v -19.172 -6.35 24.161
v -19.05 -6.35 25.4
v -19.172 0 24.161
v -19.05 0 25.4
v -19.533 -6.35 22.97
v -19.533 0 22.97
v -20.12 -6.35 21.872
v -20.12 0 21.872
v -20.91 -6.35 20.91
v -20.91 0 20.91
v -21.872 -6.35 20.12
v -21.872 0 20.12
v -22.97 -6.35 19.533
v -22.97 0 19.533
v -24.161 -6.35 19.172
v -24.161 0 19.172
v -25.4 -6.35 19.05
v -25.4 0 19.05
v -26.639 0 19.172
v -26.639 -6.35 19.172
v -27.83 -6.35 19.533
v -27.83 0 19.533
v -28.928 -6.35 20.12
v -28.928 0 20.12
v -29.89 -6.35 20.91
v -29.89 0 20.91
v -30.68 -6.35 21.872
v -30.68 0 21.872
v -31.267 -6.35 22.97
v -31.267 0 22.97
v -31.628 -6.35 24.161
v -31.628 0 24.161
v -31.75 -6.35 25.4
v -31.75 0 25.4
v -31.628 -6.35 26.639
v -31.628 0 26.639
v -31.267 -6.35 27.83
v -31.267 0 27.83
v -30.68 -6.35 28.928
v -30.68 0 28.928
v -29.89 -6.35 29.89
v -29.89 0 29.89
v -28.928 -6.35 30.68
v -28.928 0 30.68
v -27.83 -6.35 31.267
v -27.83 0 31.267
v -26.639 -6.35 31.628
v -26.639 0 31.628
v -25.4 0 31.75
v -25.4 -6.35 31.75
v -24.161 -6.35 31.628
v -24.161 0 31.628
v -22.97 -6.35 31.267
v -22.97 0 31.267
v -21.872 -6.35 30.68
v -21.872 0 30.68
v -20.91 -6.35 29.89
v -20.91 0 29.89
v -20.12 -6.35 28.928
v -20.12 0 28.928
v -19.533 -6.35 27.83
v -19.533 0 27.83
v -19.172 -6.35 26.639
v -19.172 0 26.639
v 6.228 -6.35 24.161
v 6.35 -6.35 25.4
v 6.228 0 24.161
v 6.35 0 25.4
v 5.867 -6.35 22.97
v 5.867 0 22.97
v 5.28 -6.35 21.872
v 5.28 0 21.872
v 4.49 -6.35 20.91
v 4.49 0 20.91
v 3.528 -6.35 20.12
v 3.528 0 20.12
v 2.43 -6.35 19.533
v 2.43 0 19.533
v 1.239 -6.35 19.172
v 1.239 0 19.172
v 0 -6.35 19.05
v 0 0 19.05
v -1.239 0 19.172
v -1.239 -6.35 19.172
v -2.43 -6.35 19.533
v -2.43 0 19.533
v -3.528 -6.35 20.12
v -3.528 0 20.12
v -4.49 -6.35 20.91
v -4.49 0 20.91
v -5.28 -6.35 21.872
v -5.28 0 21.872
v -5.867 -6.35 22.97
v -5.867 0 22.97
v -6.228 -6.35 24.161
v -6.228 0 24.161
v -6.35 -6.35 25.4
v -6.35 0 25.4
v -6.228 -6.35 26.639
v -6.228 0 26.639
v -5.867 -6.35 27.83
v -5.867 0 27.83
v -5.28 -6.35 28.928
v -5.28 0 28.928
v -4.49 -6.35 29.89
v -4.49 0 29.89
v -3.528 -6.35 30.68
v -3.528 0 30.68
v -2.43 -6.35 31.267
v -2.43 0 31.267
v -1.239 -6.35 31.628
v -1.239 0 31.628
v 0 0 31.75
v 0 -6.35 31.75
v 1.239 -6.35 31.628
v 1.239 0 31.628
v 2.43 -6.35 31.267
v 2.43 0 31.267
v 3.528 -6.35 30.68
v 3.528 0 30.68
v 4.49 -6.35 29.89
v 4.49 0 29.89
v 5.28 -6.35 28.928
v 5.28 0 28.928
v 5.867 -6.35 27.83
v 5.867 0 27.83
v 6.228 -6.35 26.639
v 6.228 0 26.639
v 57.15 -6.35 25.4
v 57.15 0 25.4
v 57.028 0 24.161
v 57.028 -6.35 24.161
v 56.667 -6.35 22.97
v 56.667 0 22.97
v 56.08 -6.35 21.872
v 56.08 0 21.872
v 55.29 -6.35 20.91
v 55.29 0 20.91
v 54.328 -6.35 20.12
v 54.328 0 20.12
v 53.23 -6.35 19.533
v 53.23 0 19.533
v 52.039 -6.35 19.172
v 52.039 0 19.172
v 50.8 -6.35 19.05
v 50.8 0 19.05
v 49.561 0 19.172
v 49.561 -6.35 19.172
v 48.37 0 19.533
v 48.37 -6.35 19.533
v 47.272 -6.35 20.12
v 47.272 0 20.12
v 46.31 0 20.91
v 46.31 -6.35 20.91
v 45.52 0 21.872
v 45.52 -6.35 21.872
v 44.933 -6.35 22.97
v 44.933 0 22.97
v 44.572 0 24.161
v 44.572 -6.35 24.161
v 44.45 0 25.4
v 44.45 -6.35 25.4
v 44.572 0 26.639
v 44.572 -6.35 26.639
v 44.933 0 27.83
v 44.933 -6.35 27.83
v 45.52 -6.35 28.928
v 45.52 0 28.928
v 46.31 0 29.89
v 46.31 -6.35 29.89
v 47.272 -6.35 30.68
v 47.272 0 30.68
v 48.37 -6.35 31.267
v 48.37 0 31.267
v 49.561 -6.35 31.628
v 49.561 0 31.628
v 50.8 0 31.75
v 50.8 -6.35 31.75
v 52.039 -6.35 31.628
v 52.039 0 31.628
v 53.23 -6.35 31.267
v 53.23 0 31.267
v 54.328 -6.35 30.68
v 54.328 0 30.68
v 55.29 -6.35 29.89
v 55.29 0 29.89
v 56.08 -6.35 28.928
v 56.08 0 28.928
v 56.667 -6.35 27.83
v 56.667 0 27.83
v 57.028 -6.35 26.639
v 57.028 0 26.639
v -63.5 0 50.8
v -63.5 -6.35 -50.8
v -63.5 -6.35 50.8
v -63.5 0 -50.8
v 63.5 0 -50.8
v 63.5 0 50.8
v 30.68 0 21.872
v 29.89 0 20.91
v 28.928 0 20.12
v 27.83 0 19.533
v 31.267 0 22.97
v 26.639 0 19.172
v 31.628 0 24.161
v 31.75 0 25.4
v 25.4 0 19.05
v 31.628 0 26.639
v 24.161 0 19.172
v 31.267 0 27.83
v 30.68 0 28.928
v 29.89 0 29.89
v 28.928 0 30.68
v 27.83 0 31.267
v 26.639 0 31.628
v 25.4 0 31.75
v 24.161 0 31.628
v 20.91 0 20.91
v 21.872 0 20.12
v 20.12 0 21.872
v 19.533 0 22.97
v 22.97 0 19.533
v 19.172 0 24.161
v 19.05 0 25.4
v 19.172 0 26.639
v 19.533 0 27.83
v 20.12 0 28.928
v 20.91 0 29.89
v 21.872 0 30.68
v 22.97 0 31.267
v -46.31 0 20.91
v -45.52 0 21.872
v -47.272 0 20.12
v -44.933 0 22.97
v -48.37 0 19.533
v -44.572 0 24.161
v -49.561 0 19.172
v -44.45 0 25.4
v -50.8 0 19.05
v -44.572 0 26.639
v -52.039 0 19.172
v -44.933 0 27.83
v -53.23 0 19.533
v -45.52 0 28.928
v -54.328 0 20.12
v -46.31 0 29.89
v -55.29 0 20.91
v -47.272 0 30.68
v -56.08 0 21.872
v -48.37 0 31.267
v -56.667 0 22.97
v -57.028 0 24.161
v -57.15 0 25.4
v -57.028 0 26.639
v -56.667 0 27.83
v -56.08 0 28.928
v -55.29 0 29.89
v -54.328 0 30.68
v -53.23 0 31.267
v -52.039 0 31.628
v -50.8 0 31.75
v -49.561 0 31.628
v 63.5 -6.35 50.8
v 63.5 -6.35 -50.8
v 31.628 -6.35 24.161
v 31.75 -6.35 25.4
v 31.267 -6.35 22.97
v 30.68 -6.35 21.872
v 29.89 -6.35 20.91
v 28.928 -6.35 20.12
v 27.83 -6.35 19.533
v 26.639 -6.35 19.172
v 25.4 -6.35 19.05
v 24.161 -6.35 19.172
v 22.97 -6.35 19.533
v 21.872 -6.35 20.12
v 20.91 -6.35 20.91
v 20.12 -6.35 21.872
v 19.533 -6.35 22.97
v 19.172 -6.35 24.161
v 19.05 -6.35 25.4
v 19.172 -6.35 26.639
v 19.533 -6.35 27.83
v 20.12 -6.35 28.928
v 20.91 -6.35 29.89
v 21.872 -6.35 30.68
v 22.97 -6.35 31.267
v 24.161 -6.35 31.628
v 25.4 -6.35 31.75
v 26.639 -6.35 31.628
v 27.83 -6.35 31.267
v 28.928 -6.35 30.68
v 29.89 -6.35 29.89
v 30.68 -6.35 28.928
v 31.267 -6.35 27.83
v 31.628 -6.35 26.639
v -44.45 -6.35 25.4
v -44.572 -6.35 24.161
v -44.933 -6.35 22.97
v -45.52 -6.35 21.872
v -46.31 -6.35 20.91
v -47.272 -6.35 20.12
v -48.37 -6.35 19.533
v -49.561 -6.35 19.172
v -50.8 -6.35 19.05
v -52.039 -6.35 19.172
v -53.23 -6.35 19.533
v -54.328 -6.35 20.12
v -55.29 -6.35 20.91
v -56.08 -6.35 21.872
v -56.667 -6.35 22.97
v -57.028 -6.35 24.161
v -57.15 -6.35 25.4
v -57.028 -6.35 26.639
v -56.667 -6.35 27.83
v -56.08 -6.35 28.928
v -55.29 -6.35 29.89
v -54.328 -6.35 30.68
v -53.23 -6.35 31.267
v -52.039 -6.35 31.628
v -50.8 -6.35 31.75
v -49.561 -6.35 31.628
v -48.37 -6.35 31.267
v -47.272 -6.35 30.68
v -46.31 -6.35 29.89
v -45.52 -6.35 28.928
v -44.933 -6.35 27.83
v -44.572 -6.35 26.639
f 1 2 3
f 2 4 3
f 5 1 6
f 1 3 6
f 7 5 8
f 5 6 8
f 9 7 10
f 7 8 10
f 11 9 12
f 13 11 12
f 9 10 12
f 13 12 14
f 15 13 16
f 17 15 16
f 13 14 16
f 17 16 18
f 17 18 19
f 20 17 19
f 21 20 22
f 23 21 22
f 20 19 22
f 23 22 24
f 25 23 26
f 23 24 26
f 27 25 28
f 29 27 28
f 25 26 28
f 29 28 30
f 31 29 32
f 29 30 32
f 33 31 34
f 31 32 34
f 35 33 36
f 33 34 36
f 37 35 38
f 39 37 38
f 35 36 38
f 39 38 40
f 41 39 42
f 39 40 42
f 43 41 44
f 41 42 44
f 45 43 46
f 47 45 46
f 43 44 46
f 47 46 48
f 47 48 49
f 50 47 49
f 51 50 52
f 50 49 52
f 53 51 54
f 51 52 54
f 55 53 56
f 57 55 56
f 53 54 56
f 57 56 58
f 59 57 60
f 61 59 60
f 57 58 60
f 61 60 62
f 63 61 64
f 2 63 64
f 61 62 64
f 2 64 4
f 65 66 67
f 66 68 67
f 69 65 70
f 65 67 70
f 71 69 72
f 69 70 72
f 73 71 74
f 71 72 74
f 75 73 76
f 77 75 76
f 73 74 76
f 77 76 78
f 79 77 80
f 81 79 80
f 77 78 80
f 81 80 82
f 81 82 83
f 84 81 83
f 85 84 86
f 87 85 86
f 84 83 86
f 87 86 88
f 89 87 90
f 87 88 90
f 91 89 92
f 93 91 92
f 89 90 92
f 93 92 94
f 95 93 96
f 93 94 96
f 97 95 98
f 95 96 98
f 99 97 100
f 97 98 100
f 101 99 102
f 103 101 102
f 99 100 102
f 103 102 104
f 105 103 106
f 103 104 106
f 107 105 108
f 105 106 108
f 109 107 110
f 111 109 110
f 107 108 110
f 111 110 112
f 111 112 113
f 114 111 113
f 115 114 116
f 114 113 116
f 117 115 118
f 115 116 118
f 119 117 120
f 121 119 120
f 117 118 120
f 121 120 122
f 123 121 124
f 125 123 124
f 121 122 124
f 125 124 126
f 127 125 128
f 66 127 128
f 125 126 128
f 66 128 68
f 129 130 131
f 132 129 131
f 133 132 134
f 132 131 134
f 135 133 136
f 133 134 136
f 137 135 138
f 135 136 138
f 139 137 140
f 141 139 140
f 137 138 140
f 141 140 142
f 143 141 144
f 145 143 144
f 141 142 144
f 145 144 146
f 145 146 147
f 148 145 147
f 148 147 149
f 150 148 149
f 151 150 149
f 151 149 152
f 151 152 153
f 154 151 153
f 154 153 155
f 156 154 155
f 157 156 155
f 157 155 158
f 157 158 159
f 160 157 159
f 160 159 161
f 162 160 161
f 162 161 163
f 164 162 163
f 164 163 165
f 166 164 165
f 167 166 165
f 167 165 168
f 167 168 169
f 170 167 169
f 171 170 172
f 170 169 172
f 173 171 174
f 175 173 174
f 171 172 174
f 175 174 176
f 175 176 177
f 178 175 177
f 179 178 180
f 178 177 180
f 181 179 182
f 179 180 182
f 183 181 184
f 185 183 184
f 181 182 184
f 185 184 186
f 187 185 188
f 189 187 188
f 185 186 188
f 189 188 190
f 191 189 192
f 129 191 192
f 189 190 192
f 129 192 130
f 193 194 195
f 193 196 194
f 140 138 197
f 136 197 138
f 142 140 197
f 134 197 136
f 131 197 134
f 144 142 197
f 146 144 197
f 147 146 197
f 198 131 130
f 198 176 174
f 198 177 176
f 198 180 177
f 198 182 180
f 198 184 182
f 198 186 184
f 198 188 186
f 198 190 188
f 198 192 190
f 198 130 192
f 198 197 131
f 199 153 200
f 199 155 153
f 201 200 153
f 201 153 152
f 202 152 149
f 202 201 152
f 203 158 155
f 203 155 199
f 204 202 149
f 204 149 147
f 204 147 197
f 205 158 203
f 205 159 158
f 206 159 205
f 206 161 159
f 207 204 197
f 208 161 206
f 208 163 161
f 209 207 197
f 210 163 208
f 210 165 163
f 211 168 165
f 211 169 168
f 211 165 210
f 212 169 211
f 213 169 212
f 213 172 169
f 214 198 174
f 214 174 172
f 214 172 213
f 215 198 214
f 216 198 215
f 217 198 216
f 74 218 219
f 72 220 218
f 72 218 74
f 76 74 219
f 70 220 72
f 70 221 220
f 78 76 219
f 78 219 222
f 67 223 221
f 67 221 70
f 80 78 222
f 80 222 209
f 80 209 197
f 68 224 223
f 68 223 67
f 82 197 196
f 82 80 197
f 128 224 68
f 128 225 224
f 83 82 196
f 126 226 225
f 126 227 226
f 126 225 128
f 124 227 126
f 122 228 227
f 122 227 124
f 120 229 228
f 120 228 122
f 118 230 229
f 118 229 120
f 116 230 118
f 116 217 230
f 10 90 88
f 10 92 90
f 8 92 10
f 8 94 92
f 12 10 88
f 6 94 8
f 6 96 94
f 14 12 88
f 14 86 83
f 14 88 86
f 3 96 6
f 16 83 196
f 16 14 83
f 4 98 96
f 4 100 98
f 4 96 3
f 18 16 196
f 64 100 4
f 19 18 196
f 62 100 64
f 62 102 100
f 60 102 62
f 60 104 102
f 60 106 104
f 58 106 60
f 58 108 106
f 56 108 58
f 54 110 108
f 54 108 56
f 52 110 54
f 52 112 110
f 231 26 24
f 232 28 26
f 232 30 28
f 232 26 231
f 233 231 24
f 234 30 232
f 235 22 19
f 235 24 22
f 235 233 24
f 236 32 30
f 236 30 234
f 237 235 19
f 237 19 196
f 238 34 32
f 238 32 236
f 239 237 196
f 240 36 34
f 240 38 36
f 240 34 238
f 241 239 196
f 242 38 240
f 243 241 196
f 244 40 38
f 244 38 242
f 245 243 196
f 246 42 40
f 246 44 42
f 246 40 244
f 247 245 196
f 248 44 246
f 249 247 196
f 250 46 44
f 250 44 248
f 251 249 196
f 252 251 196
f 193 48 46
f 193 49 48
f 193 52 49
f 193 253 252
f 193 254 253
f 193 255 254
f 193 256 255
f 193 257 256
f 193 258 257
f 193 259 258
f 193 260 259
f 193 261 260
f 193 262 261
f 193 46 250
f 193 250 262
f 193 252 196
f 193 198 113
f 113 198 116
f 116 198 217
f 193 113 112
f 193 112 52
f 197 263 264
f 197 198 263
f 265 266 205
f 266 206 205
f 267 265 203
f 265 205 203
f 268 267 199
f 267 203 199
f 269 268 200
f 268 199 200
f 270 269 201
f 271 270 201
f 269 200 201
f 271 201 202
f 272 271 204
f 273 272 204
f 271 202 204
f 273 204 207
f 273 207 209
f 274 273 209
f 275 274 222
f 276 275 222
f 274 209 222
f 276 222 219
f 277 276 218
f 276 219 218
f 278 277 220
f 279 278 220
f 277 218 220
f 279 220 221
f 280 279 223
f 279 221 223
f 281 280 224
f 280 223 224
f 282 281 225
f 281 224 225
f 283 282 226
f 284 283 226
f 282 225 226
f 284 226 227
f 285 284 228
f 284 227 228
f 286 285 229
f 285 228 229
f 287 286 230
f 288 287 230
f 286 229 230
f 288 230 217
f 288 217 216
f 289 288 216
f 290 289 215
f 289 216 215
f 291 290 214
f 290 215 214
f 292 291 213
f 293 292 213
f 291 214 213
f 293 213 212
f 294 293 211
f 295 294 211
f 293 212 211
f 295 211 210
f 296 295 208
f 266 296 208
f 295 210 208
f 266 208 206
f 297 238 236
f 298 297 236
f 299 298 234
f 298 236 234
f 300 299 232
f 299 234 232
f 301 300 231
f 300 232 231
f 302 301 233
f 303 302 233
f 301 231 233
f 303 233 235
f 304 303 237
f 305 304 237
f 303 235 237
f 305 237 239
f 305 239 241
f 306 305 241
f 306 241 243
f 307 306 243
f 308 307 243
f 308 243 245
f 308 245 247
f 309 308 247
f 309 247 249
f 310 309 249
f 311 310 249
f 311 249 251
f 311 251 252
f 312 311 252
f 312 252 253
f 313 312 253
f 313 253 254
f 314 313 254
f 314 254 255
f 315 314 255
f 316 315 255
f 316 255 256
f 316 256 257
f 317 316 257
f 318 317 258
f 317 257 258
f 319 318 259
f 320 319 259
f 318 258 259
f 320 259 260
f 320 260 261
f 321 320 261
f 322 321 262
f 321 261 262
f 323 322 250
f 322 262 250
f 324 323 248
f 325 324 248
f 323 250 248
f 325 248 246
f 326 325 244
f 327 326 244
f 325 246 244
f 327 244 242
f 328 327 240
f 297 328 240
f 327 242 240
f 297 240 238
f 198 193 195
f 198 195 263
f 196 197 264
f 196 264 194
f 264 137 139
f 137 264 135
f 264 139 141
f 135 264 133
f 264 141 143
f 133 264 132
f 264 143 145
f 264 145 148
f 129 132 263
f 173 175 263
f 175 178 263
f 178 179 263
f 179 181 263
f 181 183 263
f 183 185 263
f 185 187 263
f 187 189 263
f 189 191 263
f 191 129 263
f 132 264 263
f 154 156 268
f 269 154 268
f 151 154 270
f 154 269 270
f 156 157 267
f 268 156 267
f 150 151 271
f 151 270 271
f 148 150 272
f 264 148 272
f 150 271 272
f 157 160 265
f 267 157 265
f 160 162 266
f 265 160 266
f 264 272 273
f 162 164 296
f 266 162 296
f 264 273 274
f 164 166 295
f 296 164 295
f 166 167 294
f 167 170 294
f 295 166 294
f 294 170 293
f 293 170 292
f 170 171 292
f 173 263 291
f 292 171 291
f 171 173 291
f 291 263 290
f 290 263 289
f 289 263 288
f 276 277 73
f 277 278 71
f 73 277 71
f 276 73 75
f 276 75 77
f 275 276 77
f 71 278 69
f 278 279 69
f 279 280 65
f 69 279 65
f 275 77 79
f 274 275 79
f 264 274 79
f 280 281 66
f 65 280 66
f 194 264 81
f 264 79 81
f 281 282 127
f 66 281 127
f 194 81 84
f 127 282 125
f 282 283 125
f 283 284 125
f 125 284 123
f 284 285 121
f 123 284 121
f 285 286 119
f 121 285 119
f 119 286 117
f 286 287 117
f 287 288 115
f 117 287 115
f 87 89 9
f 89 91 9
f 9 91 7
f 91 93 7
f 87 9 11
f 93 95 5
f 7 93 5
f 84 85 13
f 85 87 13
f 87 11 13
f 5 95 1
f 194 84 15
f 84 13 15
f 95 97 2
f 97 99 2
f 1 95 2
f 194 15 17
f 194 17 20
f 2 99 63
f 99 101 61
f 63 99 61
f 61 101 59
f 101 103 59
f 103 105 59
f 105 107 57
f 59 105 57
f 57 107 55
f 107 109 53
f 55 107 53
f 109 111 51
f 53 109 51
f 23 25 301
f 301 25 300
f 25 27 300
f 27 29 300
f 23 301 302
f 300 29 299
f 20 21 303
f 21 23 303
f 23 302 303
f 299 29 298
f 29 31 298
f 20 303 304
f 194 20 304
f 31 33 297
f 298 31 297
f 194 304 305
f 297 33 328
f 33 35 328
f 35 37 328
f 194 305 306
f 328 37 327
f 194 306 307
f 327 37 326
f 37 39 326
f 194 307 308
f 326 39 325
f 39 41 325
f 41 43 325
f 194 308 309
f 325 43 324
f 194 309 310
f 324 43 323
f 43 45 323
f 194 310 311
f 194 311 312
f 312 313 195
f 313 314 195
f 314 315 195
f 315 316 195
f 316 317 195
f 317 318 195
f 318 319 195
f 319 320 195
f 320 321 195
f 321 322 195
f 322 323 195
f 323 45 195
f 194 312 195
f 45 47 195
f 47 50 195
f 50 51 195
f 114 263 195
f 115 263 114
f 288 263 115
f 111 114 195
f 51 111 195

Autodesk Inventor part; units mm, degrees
ref_plane "XZ Plane" through (0, 0, 0) normal (0, 1, 0) x (-1, 0, 0)
ref_plane "XY Plane" through (0, 0, 0) normal (0, 0, 1) x (1, 0, 0)
sketch "Sketch1" plane through (0, 0, 0) normal (0, 1, 0) x (-1, 0, 0)
  line L0 (63.5, 50.8) -> (-63.5, 50.8)
  line L1 (-63.5, 50.8) -> (-63.5, -50.8)
  line L2 (-63.5, -50.8) -> (63.5, -50.8)
  line L3 (63.5, -50.8) -> (63.5, 50.8)
  line L4 (63.5, 50.8) -> (-63.5, -50.8) construction
  line L5 (-63.5, 50.8) -> (63.5, -50.8) construction
  point P0 (0, 0)
  dimension "d3" = 101.6
  dimension "d13" = 127
extrude "Extrusion1" add sketch "Sketch1" against normal blind 6.35
sketch "Sketch3" plane through (0, 0, 0) normal (0, 1, 0) x (1, 0, 0)
  line L0 (-63.5, -50.8) -> (-63.5, 50.8) construction
  line L1 (-63.5, -25.4) -> (63.5, -25.4) construction
  line L2 (63.5, 50.8) -> (63.5, -50.8) construction
  line L3 (63.5, 50.8) -> (-63.5, 50.8) construction
  circle A0 centre (-50.8, -25.4) radius 6.35
  circle A1 centre (-25.4, -25.4) radius 6.35
  circle A2 centre (0, -25.4) radius 6.35
  circle A3 centre (25.4, -25.4) radius 6.35
  circle A4 centre (50.8, -25.4) radius 6.35
  point P0 (0, 0)
  dimension "d2" = 76.2
  dimension "d4" = 12.7
  dimension "d5" = 12.7
  dimension "d8" = 25.4
extrude "Extrusion2" cut sketch "Sketch3" against normal through all
properties part number "5-holes"
